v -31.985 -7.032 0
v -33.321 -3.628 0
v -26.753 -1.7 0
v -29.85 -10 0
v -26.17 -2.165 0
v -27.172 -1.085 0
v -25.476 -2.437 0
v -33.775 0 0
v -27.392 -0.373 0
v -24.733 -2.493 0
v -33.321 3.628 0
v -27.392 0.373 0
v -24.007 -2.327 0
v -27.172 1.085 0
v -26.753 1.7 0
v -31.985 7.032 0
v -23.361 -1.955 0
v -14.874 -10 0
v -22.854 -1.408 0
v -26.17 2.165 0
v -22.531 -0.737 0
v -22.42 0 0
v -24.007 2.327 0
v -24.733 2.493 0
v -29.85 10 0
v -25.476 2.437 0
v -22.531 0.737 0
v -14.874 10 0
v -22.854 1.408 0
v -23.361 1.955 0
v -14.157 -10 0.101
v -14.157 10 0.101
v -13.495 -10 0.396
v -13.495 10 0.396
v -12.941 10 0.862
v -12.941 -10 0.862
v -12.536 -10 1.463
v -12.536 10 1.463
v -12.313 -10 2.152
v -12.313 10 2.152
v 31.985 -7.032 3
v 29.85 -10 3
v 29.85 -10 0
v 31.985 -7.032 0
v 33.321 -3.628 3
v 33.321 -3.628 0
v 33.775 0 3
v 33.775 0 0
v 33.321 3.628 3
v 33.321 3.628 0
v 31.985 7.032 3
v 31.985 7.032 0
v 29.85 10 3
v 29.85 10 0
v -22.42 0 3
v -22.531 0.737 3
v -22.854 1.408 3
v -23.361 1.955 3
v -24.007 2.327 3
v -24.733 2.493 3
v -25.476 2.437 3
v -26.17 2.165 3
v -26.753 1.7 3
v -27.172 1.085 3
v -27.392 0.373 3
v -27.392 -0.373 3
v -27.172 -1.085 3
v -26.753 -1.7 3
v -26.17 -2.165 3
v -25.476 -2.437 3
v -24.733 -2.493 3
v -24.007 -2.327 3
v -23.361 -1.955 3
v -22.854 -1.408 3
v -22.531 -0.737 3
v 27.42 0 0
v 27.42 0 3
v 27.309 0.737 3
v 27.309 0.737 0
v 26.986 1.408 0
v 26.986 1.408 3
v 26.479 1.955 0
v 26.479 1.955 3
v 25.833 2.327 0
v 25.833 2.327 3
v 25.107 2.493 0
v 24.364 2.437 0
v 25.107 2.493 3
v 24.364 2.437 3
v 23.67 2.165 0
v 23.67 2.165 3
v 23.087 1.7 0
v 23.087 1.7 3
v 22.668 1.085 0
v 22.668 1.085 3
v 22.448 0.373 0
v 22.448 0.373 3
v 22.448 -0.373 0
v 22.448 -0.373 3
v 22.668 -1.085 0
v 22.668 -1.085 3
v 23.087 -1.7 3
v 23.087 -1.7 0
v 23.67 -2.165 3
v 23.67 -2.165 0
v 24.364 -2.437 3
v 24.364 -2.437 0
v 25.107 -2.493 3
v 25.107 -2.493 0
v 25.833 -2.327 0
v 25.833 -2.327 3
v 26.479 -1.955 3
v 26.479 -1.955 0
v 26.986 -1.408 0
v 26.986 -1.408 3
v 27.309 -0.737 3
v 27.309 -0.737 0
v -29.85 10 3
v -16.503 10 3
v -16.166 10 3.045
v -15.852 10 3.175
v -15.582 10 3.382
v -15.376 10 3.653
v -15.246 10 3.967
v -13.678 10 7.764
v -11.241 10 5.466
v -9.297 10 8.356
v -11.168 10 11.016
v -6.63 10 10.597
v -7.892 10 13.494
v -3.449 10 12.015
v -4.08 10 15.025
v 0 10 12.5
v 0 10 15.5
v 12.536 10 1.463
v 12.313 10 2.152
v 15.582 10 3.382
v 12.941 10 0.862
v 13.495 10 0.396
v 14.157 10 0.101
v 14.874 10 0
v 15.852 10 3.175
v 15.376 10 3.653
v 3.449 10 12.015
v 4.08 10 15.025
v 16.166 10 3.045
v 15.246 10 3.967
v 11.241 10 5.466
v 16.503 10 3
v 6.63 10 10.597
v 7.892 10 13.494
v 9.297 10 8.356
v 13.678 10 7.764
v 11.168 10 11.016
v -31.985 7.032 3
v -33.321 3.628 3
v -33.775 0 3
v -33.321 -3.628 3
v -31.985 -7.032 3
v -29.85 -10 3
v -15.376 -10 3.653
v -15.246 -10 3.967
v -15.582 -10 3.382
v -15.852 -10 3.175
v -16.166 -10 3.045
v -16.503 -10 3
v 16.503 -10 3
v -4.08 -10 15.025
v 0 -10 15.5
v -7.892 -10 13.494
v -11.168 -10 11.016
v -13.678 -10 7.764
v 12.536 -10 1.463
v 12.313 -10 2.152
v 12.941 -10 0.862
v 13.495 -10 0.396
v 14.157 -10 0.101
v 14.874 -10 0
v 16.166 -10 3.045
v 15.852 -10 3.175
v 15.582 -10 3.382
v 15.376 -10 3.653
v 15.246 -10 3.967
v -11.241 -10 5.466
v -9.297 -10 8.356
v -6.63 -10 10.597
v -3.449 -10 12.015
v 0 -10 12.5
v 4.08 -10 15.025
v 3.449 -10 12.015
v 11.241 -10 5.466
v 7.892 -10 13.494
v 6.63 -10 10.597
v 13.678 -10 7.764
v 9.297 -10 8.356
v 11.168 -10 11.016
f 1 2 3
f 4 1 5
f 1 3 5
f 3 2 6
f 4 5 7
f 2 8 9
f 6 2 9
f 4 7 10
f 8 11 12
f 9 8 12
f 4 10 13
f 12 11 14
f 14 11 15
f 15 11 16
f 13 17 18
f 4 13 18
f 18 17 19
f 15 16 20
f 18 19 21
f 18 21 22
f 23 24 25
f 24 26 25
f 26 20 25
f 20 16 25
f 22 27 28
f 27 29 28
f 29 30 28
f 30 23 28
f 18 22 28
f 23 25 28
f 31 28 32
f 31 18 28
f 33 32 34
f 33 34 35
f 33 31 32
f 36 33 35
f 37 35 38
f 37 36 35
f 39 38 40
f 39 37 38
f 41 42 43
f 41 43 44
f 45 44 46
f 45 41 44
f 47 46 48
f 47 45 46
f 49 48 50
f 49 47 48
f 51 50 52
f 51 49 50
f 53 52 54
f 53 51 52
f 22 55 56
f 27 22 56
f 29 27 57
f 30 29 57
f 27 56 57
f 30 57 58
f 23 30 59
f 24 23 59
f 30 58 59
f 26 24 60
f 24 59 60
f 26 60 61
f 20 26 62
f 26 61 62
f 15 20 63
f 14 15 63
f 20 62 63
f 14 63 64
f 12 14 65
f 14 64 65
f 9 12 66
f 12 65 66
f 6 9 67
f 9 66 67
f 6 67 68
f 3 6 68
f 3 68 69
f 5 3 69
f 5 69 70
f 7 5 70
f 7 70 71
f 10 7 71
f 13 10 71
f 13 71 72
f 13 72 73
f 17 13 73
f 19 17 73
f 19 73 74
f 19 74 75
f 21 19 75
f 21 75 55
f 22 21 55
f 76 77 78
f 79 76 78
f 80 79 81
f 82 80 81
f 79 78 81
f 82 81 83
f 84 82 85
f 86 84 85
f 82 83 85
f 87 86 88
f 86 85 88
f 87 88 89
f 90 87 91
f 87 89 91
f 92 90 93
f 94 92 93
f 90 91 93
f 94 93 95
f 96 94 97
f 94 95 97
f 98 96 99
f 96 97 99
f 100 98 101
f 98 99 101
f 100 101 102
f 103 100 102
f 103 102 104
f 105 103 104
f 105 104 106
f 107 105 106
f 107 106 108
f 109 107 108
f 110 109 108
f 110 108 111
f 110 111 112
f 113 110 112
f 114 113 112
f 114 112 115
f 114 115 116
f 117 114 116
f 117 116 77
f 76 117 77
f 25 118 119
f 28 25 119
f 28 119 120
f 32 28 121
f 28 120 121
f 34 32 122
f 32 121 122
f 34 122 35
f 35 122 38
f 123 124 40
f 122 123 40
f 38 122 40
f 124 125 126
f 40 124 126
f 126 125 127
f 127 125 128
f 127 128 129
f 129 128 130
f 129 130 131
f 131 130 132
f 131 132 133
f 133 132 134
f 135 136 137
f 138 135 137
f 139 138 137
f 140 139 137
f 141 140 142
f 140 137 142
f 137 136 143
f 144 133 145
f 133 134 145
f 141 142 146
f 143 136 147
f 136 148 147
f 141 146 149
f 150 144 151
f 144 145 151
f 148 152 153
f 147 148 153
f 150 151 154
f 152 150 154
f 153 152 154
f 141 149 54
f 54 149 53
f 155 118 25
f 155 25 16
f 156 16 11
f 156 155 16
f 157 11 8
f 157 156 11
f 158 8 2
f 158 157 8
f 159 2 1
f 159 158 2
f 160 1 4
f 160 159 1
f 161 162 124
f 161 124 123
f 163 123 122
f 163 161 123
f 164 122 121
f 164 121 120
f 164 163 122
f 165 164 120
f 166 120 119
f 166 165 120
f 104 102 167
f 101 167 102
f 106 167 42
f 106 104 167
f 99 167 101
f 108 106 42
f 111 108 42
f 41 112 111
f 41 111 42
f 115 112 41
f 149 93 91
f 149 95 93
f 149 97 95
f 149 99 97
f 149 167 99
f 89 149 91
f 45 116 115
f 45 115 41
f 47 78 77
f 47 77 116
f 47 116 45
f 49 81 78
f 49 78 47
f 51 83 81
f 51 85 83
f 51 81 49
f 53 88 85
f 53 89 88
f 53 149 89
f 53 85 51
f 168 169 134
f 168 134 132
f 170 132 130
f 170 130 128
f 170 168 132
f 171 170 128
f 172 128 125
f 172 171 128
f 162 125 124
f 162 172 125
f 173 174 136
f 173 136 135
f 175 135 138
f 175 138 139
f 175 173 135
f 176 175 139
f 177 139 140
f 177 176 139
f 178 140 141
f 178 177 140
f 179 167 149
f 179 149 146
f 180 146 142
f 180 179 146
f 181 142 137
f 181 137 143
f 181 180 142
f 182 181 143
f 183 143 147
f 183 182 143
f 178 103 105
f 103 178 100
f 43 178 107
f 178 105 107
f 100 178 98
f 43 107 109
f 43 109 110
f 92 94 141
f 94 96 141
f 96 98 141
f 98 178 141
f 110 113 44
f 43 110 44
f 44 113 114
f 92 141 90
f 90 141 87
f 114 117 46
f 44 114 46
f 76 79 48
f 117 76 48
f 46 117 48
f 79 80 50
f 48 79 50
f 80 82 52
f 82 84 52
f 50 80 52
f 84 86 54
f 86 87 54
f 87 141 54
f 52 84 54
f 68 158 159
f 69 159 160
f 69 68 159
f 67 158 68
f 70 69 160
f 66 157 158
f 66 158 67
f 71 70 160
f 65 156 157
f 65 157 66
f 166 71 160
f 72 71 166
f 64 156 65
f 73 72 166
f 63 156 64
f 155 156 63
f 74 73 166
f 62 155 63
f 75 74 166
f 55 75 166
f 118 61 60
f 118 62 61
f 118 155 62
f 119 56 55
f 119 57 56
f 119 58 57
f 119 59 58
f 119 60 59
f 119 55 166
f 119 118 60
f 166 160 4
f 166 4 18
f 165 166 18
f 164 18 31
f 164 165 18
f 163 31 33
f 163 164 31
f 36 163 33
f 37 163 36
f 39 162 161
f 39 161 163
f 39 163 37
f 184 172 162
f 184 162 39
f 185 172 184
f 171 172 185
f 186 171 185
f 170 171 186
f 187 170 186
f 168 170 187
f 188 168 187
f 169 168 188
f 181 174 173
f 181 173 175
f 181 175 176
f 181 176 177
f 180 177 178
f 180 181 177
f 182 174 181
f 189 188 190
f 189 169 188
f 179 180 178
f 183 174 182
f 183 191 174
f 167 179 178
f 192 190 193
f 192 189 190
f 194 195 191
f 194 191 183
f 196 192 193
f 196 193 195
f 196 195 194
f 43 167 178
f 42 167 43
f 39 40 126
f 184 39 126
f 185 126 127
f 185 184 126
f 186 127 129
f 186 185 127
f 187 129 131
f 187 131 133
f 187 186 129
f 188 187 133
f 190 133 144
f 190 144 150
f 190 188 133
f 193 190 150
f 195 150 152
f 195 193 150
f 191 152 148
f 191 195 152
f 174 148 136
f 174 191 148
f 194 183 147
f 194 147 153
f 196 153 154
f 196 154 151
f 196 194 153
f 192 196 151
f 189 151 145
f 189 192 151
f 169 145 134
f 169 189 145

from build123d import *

# Parameters (mm, degrees)
F1_DEPTH = 10
F2_R     = 2.5
F3_DEPTH = 25
F5_DEPTH = 3
F7_DEPTH = 3


with BuildPart() as f1:
    # F0 (on Front) → F1 (new body, symmetric)
    with BuildSketch(Plane.XZ):
        with BuildLine():
            ThreePointArc((-12.3133069376, 2.1523178808), (0, 12.5), (12.3133069376, 2.1523178808))
            ThreePointArc((12.3133069376, 2.1523178808), (13.2017484895, 0.6095259974), (14.8744747806, 0))
            Line((14.8744747806, 0), (29.85, 0))
            Line((29.85, 0), (29.85, 3))
            Line((29.85, 3), (16.503, 3))
            ThreePointArc((16.503, 3), (15.7100109406, 3.2698697404), (15.2462584222, 3.9674333051))
            ThreePointArc((15.2462584222, 3.9674333051), (9.6127418909, 12.3640200256), (0, 15.5))
            ThreePointArc((0, 15.5), (-9.6127418909, 12.3640200256), (-15.2462584222, 3.9674333051))
            ThreePointArc((-15.2462584222, 3.9674333051), (-15.7100109406, 3.2698697404), (-16.503, 3))
            Line((-16.503, 3), (-29.85, 3))
            Line((-29.85, 3), (-29.85, 0))
            Line((-29.85, 0), (-14.8744747806, 0))
            ThreePointArc((-14.8744747806, 0), (-13.2017484895, 0.6095259974), (-12.3133069376, 2.1523178808))
        make_face()
    extrude(amount=F1_DEPTH, both=True)

    # F2 (on face) → F3 (cut)
    with BuildSketch(Plane.XY.offset(3)):
        with Locations((-24.92, 0)):
            Circle(F2_R)
        with Locations((24.92, 0)):
            Circle(F2_R)
    extrude(amount=-F3_DEPTH, mode=Mode.SUBTRACT)

    # F4 (on face) → F5 (join)
    with BuildSketch(Plane.XY.offset(3)):
        with BuildLine():
            Line((-29.85, -10), (-29.85, 10))
            ThreePointArc((-29.85, 10), (-33.7754930507, 0), (-29.85, -10))
        make_face()
    extrude(amount=-F5_DEPTH)

    # F6 (on face) → F7 (join)
    with BuildSketch(Plane.XY.offset(3)):
        with BuildLine():
            Line((29.85, 10), (29.85, -10))
            ThreePointArc((29.85, -10), (33.7754930507, 0), (29.85, 10))
        make_face()
    extrude(amount=-F7_DEPTH)


solid = f1.part
